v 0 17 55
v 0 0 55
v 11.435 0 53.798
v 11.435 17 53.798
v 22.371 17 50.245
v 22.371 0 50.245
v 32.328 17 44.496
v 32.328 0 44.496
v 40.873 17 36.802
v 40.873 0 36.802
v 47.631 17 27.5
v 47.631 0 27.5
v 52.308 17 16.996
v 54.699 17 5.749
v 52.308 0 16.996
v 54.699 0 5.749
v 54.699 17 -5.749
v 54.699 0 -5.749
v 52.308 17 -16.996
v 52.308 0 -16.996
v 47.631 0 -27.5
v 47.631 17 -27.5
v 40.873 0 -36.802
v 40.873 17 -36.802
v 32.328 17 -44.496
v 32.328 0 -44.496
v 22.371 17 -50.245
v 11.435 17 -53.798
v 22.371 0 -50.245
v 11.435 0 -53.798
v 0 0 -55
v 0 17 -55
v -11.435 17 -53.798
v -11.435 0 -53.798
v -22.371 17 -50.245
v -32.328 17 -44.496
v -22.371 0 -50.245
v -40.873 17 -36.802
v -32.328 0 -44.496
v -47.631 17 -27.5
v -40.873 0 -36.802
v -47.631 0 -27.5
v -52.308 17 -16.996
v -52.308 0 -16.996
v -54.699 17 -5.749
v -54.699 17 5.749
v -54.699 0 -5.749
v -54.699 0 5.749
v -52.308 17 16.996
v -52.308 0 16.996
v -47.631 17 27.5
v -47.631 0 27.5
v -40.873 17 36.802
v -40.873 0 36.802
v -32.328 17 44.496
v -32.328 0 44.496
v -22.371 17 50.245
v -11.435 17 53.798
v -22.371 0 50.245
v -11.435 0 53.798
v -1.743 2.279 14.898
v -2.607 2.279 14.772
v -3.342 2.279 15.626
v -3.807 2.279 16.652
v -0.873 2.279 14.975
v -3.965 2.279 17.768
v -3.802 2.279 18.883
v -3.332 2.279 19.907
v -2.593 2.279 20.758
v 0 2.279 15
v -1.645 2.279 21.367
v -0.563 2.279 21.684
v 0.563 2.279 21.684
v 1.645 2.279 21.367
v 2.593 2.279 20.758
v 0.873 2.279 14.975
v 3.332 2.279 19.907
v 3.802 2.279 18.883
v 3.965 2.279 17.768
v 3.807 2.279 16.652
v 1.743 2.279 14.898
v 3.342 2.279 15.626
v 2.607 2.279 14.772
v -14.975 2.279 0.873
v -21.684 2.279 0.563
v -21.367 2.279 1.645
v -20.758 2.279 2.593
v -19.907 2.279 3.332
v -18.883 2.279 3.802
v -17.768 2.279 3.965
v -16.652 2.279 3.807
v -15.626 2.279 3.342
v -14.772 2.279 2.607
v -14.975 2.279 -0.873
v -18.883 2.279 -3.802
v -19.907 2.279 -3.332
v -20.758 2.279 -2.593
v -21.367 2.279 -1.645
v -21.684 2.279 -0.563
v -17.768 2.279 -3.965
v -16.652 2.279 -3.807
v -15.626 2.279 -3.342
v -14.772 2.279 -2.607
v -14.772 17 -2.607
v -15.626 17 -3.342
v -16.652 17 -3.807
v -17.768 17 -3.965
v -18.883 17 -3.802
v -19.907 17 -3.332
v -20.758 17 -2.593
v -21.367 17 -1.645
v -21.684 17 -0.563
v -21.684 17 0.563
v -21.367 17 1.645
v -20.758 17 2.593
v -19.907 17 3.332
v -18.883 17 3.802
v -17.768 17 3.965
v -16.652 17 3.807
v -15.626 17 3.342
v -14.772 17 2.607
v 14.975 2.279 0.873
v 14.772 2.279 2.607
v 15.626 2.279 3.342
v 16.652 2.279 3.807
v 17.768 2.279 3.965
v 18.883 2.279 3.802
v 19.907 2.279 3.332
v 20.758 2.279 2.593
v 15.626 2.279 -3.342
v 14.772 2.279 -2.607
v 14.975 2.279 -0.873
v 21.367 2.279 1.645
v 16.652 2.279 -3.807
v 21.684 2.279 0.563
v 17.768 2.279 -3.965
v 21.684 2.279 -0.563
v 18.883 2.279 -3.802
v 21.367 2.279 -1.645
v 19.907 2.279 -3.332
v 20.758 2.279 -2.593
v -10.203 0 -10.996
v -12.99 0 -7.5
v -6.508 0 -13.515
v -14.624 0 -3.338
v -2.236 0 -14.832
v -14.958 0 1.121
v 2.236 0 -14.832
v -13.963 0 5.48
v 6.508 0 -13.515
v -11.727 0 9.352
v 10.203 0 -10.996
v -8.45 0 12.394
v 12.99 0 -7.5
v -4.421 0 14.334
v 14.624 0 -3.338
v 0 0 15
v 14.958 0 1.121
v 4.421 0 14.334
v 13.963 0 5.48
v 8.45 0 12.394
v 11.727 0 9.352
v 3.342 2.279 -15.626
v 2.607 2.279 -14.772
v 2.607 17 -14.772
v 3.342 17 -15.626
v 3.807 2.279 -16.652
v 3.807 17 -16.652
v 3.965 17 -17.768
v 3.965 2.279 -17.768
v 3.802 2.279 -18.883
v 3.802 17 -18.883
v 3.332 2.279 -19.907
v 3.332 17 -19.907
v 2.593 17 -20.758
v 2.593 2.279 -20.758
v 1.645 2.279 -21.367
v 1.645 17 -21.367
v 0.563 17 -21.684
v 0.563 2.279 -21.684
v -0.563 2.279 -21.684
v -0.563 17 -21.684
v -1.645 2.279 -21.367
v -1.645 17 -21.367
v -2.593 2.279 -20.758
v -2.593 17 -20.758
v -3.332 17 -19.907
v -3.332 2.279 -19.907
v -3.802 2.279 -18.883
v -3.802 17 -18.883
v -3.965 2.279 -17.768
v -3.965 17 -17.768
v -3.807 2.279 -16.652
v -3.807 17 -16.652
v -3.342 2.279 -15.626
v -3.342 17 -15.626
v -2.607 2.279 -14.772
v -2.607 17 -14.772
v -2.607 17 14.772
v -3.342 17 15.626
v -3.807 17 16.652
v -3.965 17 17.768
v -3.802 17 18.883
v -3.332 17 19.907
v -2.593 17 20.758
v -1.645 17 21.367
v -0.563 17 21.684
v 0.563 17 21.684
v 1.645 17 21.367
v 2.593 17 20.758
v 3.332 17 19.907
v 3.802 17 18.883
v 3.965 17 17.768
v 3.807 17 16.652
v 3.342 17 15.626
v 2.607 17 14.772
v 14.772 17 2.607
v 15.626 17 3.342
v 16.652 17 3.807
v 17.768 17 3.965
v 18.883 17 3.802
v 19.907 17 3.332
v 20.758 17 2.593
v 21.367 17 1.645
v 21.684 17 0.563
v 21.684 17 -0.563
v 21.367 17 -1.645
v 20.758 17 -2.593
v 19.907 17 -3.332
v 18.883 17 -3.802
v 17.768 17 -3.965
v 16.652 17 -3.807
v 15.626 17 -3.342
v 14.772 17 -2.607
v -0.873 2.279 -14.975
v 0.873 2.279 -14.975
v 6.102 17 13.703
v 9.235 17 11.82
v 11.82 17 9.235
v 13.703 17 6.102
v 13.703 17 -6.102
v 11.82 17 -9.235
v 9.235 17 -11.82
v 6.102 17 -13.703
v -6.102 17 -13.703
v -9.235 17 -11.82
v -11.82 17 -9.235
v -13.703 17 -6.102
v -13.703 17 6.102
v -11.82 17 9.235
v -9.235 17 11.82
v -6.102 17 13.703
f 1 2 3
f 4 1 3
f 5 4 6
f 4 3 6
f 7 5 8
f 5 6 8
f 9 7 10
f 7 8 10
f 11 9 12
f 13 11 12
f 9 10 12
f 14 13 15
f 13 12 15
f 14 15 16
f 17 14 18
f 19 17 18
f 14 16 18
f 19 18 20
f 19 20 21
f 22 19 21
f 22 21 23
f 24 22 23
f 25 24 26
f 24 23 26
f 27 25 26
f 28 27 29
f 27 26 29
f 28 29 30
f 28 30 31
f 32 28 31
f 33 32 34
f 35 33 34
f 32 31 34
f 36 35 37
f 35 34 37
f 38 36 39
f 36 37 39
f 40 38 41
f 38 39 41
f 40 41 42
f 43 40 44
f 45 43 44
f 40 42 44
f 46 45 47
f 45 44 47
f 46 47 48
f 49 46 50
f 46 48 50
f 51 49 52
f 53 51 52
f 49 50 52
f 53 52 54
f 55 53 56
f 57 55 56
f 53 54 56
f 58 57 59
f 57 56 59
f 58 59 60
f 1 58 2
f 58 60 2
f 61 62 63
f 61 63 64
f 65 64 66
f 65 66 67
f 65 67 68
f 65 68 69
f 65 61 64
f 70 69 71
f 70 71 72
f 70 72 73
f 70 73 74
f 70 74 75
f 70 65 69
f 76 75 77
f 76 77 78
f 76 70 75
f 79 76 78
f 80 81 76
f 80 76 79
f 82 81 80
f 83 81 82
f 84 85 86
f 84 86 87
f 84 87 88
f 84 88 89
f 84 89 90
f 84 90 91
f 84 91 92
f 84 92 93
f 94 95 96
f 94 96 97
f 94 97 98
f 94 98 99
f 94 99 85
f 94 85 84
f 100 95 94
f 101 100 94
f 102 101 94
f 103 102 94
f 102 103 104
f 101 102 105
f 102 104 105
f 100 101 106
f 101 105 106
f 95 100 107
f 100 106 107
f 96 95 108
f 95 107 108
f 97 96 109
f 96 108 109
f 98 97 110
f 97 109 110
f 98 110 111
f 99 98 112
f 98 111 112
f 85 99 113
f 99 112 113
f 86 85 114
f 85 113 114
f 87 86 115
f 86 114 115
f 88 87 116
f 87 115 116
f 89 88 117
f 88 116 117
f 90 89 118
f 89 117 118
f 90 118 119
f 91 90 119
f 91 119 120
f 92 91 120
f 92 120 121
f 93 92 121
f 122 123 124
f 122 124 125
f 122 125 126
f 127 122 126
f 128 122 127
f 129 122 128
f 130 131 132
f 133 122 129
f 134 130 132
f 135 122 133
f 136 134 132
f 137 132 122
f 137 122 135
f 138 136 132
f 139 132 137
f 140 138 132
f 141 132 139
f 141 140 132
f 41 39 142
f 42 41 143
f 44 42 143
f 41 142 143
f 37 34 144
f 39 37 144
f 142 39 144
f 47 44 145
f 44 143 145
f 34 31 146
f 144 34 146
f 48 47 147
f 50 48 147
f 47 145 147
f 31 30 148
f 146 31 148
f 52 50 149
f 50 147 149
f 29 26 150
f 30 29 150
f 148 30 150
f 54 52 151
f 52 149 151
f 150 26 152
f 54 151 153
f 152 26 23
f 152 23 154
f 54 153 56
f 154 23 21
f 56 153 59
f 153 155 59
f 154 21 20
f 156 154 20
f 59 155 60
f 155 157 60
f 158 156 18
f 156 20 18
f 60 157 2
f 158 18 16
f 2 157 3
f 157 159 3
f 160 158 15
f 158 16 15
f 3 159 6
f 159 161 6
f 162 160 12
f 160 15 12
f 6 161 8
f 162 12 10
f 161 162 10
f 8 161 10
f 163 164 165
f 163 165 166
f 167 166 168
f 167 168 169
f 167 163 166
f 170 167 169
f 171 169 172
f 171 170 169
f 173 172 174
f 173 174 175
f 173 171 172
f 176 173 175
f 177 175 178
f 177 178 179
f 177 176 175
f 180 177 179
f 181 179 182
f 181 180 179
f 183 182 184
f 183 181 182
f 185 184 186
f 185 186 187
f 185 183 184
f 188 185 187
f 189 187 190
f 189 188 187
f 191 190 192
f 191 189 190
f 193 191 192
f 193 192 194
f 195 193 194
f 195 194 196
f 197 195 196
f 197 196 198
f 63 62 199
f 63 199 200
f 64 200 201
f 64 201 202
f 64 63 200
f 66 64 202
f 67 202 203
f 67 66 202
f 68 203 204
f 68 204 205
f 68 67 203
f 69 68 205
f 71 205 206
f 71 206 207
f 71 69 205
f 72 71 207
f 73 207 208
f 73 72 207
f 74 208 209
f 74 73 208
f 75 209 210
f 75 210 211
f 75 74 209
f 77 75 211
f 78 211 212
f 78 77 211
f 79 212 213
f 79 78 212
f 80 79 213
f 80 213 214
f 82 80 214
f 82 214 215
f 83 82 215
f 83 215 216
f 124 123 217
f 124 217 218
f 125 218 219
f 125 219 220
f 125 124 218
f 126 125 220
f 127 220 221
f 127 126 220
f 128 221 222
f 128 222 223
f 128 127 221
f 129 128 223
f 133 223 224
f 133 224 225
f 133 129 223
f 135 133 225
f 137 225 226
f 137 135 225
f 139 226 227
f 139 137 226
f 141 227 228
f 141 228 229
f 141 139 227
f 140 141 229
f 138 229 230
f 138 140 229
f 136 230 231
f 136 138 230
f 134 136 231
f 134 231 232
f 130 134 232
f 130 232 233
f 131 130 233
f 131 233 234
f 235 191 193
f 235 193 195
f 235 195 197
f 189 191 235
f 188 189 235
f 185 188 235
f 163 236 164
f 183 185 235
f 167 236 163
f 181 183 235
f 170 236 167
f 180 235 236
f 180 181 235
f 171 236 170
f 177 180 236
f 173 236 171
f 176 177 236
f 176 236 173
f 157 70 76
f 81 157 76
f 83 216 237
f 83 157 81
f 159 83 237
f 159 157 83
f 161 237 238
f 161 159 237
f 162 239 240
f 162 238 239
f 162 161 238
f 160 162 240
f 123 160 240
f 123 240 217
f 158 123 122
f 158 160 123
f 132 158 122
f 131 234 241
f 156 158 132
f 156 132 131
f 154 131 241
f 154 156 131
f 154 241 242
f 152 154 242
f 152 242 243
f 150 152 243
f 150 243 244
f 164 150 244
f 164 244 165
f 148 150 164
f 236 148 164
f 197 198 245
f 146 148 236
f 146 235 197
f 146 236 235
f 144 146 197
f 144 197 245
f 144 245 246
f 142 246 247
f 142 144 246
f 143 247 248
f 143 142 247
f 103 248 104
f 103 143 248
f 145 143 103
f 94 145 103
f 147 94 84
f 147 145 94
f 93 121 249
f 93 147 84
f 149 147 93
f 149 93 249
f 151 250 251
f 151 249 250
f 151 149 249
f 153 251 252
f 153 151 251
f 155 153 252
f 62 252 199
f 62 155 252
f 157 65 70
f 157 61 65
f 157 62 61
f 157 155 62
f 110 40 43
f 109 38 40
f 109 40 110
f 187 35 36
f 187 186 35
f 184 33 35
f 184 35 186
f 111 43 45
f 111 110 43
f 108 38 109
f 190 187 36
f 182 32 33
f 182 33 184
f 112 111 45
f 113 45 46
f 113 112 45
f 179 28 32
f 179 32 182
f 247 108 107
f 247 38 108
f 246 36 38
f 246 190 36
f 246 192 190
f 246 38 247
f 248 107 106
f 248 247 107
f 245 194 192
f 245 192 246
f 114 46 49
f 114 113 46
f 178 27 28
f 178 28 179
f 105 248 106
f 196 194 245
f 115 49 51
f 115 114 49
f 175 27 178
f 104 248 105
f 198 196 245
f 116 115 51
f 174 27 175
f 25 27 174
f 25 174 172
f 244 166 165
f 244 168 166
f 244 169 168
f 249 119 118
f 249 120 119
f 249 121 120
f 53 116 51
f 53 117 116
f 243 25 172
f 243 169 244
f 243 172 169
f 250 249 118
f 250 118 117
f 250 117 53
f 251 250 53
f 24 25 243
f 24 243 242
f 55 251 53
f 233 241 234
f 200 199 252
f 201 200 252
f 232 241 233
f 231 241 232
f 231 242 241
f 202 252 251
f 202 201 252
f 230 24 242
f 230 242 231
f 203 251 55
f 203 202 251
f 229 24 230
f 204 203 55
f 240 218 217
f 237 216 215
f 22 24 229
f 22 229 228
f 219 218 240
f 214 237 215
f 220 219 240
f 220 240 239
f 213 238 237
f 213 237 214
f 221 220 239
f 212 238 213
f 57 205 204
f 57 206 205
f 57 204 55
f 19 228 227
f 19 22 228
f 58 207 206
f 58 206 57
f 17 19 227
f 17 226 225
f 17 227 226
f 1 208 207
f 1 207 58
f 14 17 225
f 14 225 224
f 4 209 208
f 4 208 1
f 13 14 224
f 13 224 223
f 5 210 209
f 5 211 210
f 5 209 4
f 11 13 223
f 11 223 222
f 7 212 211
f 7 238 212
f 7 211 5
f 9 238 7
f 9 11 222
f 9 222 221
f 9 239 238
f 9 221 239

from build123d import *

# Parameters (mm, degrees)
SKETCH1_R           = 55
BOSS_EXTRUDE1_DEPTH = 17
SKETCH2_R           = 15
CUT_EXTRUDE1_DEPTH  = 80.617837197
SKETCH3_R           = 3.964920539
CUT_EXTRUDE2_DEPTH  = 14.720649074
CIRPATTERN1_COUNT   = 4


with BuildPart() as part:
    # Sketch1 → Boss-Extrude1 (new body)
    with BuildSketch(Plane(origin=(0, 0, 0), x_dir=(1, 0, 0), z_dir=(0, 1, 0))):
        Circle(SKETCH1_R)
    extrude(amount=BOSS_EXTRUDE1_DEPTH)

    # Sketch2 → Cut-Extrude1 (cut, through all)
    with BuildSketch(Plane(origin=(0, 0, 0), x_dir=(1, 0, 0), z_dir=(0, 1, 0))):
        Circle(SKETCH2_R)
    extrude(amount=CUT_EXTRUDE1_DEPTH, mode=Mode.SUBTRACT)

    # Sketch3 → Cut-Extrude2 (cut)
    with BuildSketch(Plane(origin=(0, 17, 0), x_dir=(1, 0, 0), z_dir=(0, 1, 0))):
        with Locations((-17.758888816, 0)):
            Circle(SKETCH3_R)
    cut_extrude2 = extrude(amount=-CUT_EXTRUDE2_DEPTH, mode=Mode.SUBTRACT)

    # CirPattern1: Cut-Extrude2 ×4 about axis
    cirpattern1_axis = Axis((0, 0, 0), (0, 1, 0))
    for i in range(1, CIRPATTERN1_COUNT):
        add(cut_extrude2.rotate(cirpattern1_axis, i * 360 / CIRPATTERN1_COUNT), mode=Mode.SUBTRACT)


solid = part.part
